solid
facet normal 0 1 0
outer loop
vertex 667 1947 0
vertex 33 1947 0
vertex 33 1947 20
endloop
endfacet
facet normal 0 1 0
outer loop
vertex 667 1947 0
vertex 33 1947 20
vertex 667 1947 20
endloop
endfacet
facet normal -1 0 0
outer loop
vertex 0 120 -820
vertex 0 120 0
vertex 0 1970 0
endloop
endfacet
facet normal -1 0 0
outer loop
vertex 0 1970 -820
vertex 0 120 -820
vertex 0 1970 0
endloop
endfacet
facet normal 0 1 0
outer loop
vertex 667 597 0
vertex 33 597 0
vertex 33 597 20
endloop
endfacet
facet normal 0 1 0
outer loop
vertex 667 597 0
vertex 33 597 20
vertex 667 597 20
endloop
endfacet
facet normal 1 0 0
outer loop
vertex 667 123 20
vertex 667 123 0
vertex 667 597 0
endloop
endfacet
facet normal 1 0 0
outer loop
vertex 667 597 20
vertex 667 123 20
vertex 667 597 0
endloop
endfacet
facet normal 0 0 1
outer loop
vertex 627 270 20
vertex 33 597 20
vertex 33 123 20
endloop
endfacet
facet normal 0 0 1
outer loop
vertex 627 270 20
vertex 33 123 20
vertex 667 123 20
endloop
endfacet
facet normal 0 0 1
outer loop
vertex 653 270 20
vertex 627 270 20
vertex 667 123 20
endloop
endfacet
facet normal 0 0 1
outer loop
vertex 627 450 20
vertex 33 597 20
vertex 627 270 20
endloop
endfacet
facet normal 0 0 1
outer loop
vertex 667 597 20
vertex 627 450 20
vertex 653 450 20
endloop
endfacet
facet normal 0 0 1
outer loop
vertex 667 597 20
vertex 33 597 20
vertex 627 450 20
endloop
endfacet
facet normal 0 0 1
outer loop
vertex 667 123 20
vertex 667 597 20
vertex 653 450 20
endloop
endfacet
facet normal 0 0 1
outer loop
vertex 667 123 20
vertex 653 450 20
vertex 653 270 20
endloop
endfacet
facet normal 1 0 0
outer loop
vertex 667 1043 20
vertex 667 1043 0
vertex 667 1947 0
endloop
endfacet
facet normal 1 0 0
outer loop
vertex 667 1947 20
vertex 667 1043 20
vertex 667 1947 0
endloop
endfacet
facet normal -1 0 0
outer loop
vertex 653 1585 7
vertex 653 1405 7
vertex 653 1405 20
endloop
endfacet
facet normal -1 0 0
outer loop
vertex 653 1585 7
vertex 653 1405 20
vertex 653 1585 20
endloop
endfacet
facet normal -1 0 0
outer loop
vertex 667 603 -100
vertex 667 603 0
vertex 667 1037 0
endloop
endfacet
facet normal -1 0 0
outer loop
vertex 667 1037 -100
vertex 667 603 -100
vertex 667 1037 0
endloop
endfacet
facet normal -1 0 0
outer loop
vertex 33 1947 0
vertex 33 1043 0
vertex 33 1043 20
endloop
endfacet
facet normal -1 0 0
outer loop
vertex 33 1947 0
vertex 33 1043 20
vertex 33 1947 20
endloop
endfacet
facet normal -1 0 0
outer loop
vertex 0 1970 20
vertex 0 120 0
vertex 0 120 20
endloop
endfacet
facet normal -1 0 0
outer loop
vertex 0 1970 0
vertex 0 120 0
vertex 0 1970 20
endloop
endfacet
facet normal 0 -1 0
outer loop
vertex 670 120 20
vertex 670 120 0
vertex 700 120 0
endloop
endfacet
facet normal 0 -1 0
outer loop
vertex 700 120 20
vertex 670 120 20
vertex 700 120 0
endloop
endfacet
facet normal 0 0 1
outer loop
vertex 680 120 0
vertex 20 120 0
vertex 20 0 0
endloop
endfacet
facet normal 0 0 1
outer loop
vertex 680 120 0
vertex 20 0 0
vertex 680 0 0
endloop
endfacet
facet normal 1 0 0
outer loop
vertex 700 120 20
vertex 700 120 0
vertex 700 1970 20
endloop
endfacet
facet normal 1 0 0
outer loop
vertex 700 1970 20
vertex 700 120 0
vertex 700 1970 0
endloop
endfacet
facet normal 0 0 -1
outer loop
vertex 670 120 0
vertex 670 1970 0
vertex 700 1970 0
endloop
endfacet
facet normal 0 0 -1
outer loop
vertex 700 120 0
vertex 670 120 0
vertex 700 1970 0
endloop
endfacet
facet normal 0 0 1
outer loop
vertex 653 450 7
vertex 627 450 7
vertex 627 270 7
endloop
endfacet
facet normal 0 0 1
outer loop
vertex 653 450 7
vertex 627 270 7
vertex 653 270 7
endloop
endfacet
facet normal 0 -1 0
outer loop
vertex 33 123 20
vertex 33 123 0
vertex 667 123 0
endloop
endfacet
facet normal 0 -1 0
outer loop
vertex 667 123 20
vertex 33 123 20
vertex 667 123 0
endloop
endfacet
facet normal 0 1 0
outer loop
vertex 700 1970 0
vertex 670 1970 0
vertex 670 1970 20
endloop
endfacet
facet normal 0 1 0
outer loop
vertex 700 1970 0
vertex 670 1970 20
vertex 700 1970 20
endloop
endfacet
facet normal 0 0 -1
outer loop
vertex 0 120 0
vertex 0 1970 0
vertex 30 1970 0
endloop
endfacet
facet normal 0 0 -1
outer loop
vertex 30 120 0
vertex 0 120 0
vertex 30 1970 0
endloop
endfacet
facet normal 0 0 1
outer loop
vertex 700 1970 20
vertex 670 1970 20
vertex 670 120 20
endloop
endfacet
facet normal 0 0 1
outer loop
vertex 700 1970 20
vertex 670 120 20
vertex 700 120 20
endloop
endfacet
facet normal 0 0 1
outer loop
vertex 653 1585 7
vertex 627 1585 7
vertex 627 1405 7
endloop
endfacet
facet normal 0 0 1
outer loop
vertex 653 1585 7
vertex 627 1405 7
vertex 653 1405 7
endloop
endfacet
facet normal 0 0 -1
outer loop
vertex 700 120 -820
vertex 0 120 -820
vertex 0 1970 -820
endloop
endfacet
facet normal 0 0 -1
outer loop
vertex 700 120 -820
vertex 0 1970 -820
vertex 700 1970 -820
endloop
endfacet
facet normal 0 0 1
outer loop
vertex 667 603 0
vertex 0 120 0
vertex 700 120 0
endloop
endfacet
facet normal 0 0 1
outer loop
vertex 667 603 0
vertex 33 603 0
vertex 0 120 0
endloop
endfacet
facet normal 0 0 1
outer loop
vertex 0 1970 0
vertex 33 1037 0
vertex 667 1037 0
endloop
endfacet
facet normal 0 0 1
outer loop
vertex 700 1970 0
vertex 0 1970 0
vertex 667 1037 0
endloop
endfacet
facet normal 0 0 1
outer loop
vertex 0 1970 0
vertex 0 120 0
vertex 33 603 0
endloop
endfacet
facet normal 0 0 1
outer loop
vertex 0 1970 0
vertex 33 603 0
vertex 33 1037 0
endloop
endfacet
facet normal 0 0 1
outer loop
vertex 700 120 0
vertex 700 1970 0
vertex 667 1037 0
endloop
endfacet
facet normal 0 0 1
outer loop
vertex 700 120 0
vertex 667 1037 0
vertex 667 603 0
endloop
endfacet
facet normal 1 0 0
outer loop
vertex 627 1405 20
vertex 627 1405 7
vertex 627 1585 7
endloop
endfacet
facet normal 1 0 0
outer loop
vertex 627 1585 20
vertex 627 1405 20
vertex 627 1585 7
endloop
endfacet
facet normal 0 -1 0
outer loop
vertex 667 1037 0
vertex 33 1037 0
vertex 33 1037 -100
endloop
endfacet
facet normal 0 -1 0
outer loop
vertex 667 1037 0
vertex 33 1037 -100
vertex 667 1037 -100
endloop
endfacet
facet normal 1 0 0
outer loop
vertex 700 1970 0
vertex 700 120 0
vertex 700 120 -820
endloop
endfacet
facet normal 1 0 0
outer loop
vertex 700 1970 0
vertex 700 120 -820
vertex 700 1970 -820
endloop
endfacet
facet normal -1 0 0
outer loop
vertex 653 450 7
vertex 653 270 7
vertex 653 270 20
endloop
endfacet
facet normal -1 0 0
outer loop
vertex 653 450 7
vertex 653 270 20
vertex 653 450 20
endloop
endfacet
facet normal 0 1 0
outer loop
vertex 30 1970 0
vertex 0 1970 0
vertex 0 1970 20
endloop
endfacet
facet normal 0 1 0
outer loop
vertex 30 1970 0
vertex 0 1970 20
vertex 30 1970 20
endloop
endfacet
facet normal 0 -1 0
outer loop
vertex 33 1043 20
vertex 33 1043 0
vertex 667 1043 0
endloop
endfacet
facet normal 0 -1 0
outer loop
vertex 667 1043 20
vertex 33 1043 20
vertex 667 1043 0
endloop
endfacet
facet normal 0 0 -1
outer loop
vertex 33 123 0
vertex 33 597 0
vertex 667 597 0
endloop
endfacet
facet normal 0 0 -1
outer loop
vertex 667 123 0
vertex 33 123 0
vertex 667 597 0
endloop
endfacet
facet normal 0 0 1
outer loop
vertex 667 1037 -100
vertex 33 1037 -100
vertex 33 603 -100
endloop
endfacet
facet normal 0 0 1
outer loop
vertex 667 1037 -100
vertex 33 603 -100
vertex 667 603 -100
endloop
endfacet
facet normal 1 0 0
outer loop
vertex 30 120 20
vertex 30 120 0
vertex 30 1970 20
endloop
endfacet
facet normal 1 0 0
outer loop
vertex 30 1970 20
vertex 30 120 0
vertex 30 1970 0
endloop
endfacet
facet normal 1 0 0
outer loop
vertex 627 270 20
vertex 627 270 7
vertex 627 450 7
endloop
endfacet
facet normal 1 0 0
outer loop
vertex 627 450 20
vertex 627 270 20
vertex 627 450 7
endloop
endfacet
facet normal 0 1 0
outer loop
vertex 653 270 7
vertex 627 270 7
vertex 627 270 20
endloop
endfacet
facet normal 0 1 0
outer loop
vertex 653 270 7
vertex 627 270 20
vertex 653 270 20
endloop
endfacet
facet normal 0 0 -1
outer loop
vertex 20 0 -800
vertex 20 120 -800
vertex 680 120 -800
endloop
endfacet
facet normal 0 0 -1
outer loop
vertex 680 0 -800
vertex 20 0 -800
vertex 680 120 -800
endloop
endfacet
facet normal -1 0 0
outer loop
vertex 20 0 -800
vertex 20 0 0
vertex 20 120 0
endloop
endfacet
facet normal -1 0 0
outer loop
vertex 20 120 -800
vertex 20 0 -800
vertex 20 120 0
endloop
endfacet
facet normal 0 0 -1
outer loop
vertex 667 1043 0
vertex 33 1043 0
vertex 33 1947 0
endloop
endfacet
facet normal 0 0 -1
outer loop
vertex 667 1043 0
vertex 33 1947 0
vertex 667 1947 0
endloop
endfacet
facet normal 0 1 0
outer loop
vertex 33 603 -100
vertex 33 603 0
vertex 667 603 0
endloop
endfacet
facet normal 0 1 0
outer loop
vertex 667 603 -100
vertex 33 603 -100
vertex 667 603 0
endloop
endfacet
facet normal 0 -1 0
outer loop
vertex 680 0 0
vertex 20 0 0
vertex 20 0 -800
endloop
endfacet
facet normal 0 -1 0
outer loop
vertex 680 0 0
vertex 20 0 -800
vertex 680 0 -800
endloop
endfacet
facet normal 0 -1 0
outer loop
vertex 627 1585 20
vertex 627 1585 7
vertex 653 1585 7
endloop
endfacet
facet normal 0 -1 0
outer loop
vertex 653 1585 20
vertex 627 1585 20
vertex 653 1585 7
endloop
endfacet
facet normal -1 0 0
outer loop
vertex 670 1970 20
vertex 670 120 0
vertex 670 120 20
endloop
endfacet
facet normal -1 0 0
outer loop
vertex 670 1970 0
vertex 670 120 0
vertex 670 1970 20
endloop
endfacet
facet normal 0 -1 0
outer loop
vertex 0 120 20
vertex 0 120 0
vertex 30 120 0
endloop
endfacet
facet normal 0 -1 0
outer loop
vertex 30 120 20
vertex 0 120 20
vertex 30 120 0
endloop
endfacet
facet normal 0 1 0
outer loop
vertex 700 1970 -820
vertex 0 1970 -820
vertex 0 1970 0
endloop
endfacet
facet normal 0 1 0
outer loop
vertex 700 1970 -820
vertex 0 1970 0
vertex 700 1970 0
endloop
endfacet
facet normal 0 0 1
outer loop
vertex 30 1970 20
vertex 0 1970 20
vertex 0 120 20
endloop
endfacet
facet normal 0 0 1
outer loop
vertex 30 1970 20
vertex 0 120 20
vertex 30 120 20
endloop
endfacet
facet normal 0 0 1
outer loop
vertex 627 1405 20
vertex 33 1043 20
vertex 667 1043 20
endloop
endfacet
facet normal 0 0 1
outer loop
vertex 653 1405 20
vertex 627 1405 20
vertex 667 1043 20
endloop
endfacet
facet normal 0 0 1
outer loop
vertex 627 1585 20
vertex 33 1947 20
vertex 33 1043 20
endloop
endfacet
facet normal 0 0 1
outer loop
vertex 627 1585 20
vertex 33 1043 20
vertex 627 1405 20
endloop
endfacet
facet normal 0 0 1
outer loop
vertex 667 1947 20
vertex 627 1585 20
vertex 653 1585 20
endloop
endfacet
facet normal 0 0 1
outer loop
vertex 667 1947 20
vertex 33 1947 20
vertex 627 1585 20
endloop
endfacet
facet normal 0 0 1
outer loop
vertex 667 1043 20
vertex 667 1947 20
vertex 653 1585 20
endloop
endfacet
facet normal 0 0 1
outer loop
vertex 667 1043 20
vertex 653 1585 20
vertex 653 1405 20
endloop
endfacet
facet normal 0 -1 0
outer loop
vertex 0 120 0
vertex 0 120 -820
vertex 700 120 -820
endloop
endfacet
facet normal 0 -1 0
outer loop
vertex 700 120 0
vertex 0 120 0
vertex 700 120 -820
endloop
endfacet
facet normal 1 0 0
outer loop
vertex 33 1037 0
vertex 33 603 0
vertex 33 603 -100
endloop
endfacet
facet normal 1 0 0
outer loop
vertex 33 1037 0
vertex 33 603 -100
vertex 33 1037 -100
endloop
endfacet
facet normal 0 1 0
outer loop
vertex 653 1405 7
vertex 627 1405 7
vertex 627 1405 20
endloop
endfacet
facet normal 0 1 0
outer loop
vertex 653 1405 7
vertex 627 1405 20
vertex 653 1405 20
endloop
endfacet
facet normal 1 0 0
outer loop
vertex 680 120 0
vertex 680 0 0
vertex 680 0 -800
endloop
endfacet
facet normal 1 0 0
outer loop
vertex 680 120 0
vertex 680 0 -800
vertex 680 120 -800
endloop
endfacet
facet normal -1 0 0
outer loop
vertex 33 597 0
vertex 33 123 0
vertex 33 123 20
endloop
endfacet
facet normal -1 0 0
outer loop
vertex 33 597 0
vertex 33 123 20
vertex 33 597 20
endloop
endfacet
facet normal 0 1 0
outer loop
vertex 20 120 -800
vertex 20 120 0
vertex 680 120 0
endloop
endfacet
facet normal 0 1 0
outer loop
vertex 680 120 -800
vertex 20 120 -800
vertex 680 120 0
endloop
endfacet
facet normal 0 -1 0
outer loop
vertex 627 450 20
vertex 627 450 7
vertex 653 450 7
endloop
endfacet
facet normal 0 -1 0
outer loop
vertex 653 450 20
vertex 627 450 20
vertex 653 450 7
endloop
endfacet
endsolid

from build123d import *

# Parameters (mm, degrees)
SKETCH1_W                 = 700
SKETCH1_H                 = 1850
GOVDE_KASA_DEPTH          = 820
SKETCH2_W                 = 660
SKETCH2_H                 = 120
PLINT_DEPTH               = 800
SKETCH3_W                 = 30
SKETCH3_H                 = 1850
SOVE_SOL_DEPTH            = 20
SKETCH4_W                 = 30
SKETCH4_H                 = 1850
SOVE_SAG_DEPTH            = 20
SKETCH5_W                 = 634
SKETCH5_H                 = 904
KAPI_SARJOR_DEPTH         = 20
KAPI_SARJOR_KULP_START    = 7
SKETCH6_W                 = 26
SKETCH6_H                 = 180
KAPI_SARJOR_KULP_DEPTH    = 13
SKETCH7_W                 = 634
SKETCH7_H                 = 434
ACIKLIK_KUTULAMA_DEPTH    = 100
SKETCH8_W                 = 634
SKETCH8_H                 = 474
KAPAK_PANO_MEK_DEPTH      = 20
KAPAK_PANO_MEK_KULP_START = 7
SKETCH9_W                 = 26
SKETCH9_H                 = 180
KAPAK_PANO_MEK_KULP_DEPTH = 13


with BuildPart() as part:
    # Sketch1 → govde_kasa (new body)
    with BuildSketch(Plane.XY):
        with Locations((350, 1045)):
            Rectangle(SKETCH1_W, SKETCH1_H)
    extrude(amount=-GOVDE_KASA_DEPTH)

    # Sketch7 → aciklik_kutulama (cut)
    with BuildSketch(Plane.XY):
        with Locations((350, 820)):
            Rectangle(SKETCH7_W, SKETCH7_H)
    extrude(amount=-ACIKLIK_KUTULAMA_DEPTH, mode=Mode.SUBTRACT)


with BuildPart() as body_2:
    # Sketch2 → plint (new body)
    with BuildSketch(Plane.XY):
        with Locations((350, 60)):
            Rectangle(SKETCH2_W, SKETCH2_H)
    extrude(amount=-PLINT_DEPTH)


with BuildPart() as body_3:
    # Sketch3 → sove_sol (new body)
    with BuildSketch(Plane.XY):
        with Locations((15, 1045)):
            Rectangle(SKETCH3_W, SKETCH3_H)
    extrude(amount=SOVE_SOL_DEPTH)


with BuildPart() as body_4:
    # Sketch4 → sove_sag (new body)
    with BuildSketch(Plane.XY):
        with Locations((685, 1045)):
            Rectangle(SKETCH4_W, SKETCH4_H)
    extrude(amount=SOVE_SAG_DEPTH)


with BuildPart() as body_5:
    # Sketch5 → kapi_sarjor (new body)
    with BuildSketch(Plane.XY):
        with Locations((350, 1495)):
            Rectangle(SKETCH5_W, SKETCH5_H)
    extrude(amount=KAPI_SARJOR_DEPTH)

    # Sketch6 → kapi_sarjor_kulp (cut)
    with BuildSketch(Plane.XY.offset(KAPI_SARJOR_KULP_START)):
        with Locations((640, 1495)):
            Rectangle(SKETCH6_W, SKETCH6_H)
    extrude(amount=KAPI_SARJOR_KULP_DEPTH, mode=Mode.SUBTRACT)


with BuildPart() as body_6:
    # Sketch8 → kapak_pano_mek (new body)
    with BuildSketch(Plane.XY):
        with Locations((350, 360)):
            Rectangle(SKETCH8_W, SKETCH8_H)
    extrude(amount=KAPAK_PANO_MEK_DEPTH)

    # Sketch9 → kapak_pano_mek_kulp (cut)
    with BuildSketch(Plane.XY.offset(KAPAK_PANO_MEK_KULP_START)):
        with Locations((640, 360)):
            Rectangle(SKETCH9_W, SKETCH9_H)
    extrude(amount=KAPAK_PANO_MEK_KULP_DEPTH, mode=Mode.SUBTRACT)


solid = Compound([part.part, body_2.part, body_3.part, body_4.part, body_5.part, body_6.part])
